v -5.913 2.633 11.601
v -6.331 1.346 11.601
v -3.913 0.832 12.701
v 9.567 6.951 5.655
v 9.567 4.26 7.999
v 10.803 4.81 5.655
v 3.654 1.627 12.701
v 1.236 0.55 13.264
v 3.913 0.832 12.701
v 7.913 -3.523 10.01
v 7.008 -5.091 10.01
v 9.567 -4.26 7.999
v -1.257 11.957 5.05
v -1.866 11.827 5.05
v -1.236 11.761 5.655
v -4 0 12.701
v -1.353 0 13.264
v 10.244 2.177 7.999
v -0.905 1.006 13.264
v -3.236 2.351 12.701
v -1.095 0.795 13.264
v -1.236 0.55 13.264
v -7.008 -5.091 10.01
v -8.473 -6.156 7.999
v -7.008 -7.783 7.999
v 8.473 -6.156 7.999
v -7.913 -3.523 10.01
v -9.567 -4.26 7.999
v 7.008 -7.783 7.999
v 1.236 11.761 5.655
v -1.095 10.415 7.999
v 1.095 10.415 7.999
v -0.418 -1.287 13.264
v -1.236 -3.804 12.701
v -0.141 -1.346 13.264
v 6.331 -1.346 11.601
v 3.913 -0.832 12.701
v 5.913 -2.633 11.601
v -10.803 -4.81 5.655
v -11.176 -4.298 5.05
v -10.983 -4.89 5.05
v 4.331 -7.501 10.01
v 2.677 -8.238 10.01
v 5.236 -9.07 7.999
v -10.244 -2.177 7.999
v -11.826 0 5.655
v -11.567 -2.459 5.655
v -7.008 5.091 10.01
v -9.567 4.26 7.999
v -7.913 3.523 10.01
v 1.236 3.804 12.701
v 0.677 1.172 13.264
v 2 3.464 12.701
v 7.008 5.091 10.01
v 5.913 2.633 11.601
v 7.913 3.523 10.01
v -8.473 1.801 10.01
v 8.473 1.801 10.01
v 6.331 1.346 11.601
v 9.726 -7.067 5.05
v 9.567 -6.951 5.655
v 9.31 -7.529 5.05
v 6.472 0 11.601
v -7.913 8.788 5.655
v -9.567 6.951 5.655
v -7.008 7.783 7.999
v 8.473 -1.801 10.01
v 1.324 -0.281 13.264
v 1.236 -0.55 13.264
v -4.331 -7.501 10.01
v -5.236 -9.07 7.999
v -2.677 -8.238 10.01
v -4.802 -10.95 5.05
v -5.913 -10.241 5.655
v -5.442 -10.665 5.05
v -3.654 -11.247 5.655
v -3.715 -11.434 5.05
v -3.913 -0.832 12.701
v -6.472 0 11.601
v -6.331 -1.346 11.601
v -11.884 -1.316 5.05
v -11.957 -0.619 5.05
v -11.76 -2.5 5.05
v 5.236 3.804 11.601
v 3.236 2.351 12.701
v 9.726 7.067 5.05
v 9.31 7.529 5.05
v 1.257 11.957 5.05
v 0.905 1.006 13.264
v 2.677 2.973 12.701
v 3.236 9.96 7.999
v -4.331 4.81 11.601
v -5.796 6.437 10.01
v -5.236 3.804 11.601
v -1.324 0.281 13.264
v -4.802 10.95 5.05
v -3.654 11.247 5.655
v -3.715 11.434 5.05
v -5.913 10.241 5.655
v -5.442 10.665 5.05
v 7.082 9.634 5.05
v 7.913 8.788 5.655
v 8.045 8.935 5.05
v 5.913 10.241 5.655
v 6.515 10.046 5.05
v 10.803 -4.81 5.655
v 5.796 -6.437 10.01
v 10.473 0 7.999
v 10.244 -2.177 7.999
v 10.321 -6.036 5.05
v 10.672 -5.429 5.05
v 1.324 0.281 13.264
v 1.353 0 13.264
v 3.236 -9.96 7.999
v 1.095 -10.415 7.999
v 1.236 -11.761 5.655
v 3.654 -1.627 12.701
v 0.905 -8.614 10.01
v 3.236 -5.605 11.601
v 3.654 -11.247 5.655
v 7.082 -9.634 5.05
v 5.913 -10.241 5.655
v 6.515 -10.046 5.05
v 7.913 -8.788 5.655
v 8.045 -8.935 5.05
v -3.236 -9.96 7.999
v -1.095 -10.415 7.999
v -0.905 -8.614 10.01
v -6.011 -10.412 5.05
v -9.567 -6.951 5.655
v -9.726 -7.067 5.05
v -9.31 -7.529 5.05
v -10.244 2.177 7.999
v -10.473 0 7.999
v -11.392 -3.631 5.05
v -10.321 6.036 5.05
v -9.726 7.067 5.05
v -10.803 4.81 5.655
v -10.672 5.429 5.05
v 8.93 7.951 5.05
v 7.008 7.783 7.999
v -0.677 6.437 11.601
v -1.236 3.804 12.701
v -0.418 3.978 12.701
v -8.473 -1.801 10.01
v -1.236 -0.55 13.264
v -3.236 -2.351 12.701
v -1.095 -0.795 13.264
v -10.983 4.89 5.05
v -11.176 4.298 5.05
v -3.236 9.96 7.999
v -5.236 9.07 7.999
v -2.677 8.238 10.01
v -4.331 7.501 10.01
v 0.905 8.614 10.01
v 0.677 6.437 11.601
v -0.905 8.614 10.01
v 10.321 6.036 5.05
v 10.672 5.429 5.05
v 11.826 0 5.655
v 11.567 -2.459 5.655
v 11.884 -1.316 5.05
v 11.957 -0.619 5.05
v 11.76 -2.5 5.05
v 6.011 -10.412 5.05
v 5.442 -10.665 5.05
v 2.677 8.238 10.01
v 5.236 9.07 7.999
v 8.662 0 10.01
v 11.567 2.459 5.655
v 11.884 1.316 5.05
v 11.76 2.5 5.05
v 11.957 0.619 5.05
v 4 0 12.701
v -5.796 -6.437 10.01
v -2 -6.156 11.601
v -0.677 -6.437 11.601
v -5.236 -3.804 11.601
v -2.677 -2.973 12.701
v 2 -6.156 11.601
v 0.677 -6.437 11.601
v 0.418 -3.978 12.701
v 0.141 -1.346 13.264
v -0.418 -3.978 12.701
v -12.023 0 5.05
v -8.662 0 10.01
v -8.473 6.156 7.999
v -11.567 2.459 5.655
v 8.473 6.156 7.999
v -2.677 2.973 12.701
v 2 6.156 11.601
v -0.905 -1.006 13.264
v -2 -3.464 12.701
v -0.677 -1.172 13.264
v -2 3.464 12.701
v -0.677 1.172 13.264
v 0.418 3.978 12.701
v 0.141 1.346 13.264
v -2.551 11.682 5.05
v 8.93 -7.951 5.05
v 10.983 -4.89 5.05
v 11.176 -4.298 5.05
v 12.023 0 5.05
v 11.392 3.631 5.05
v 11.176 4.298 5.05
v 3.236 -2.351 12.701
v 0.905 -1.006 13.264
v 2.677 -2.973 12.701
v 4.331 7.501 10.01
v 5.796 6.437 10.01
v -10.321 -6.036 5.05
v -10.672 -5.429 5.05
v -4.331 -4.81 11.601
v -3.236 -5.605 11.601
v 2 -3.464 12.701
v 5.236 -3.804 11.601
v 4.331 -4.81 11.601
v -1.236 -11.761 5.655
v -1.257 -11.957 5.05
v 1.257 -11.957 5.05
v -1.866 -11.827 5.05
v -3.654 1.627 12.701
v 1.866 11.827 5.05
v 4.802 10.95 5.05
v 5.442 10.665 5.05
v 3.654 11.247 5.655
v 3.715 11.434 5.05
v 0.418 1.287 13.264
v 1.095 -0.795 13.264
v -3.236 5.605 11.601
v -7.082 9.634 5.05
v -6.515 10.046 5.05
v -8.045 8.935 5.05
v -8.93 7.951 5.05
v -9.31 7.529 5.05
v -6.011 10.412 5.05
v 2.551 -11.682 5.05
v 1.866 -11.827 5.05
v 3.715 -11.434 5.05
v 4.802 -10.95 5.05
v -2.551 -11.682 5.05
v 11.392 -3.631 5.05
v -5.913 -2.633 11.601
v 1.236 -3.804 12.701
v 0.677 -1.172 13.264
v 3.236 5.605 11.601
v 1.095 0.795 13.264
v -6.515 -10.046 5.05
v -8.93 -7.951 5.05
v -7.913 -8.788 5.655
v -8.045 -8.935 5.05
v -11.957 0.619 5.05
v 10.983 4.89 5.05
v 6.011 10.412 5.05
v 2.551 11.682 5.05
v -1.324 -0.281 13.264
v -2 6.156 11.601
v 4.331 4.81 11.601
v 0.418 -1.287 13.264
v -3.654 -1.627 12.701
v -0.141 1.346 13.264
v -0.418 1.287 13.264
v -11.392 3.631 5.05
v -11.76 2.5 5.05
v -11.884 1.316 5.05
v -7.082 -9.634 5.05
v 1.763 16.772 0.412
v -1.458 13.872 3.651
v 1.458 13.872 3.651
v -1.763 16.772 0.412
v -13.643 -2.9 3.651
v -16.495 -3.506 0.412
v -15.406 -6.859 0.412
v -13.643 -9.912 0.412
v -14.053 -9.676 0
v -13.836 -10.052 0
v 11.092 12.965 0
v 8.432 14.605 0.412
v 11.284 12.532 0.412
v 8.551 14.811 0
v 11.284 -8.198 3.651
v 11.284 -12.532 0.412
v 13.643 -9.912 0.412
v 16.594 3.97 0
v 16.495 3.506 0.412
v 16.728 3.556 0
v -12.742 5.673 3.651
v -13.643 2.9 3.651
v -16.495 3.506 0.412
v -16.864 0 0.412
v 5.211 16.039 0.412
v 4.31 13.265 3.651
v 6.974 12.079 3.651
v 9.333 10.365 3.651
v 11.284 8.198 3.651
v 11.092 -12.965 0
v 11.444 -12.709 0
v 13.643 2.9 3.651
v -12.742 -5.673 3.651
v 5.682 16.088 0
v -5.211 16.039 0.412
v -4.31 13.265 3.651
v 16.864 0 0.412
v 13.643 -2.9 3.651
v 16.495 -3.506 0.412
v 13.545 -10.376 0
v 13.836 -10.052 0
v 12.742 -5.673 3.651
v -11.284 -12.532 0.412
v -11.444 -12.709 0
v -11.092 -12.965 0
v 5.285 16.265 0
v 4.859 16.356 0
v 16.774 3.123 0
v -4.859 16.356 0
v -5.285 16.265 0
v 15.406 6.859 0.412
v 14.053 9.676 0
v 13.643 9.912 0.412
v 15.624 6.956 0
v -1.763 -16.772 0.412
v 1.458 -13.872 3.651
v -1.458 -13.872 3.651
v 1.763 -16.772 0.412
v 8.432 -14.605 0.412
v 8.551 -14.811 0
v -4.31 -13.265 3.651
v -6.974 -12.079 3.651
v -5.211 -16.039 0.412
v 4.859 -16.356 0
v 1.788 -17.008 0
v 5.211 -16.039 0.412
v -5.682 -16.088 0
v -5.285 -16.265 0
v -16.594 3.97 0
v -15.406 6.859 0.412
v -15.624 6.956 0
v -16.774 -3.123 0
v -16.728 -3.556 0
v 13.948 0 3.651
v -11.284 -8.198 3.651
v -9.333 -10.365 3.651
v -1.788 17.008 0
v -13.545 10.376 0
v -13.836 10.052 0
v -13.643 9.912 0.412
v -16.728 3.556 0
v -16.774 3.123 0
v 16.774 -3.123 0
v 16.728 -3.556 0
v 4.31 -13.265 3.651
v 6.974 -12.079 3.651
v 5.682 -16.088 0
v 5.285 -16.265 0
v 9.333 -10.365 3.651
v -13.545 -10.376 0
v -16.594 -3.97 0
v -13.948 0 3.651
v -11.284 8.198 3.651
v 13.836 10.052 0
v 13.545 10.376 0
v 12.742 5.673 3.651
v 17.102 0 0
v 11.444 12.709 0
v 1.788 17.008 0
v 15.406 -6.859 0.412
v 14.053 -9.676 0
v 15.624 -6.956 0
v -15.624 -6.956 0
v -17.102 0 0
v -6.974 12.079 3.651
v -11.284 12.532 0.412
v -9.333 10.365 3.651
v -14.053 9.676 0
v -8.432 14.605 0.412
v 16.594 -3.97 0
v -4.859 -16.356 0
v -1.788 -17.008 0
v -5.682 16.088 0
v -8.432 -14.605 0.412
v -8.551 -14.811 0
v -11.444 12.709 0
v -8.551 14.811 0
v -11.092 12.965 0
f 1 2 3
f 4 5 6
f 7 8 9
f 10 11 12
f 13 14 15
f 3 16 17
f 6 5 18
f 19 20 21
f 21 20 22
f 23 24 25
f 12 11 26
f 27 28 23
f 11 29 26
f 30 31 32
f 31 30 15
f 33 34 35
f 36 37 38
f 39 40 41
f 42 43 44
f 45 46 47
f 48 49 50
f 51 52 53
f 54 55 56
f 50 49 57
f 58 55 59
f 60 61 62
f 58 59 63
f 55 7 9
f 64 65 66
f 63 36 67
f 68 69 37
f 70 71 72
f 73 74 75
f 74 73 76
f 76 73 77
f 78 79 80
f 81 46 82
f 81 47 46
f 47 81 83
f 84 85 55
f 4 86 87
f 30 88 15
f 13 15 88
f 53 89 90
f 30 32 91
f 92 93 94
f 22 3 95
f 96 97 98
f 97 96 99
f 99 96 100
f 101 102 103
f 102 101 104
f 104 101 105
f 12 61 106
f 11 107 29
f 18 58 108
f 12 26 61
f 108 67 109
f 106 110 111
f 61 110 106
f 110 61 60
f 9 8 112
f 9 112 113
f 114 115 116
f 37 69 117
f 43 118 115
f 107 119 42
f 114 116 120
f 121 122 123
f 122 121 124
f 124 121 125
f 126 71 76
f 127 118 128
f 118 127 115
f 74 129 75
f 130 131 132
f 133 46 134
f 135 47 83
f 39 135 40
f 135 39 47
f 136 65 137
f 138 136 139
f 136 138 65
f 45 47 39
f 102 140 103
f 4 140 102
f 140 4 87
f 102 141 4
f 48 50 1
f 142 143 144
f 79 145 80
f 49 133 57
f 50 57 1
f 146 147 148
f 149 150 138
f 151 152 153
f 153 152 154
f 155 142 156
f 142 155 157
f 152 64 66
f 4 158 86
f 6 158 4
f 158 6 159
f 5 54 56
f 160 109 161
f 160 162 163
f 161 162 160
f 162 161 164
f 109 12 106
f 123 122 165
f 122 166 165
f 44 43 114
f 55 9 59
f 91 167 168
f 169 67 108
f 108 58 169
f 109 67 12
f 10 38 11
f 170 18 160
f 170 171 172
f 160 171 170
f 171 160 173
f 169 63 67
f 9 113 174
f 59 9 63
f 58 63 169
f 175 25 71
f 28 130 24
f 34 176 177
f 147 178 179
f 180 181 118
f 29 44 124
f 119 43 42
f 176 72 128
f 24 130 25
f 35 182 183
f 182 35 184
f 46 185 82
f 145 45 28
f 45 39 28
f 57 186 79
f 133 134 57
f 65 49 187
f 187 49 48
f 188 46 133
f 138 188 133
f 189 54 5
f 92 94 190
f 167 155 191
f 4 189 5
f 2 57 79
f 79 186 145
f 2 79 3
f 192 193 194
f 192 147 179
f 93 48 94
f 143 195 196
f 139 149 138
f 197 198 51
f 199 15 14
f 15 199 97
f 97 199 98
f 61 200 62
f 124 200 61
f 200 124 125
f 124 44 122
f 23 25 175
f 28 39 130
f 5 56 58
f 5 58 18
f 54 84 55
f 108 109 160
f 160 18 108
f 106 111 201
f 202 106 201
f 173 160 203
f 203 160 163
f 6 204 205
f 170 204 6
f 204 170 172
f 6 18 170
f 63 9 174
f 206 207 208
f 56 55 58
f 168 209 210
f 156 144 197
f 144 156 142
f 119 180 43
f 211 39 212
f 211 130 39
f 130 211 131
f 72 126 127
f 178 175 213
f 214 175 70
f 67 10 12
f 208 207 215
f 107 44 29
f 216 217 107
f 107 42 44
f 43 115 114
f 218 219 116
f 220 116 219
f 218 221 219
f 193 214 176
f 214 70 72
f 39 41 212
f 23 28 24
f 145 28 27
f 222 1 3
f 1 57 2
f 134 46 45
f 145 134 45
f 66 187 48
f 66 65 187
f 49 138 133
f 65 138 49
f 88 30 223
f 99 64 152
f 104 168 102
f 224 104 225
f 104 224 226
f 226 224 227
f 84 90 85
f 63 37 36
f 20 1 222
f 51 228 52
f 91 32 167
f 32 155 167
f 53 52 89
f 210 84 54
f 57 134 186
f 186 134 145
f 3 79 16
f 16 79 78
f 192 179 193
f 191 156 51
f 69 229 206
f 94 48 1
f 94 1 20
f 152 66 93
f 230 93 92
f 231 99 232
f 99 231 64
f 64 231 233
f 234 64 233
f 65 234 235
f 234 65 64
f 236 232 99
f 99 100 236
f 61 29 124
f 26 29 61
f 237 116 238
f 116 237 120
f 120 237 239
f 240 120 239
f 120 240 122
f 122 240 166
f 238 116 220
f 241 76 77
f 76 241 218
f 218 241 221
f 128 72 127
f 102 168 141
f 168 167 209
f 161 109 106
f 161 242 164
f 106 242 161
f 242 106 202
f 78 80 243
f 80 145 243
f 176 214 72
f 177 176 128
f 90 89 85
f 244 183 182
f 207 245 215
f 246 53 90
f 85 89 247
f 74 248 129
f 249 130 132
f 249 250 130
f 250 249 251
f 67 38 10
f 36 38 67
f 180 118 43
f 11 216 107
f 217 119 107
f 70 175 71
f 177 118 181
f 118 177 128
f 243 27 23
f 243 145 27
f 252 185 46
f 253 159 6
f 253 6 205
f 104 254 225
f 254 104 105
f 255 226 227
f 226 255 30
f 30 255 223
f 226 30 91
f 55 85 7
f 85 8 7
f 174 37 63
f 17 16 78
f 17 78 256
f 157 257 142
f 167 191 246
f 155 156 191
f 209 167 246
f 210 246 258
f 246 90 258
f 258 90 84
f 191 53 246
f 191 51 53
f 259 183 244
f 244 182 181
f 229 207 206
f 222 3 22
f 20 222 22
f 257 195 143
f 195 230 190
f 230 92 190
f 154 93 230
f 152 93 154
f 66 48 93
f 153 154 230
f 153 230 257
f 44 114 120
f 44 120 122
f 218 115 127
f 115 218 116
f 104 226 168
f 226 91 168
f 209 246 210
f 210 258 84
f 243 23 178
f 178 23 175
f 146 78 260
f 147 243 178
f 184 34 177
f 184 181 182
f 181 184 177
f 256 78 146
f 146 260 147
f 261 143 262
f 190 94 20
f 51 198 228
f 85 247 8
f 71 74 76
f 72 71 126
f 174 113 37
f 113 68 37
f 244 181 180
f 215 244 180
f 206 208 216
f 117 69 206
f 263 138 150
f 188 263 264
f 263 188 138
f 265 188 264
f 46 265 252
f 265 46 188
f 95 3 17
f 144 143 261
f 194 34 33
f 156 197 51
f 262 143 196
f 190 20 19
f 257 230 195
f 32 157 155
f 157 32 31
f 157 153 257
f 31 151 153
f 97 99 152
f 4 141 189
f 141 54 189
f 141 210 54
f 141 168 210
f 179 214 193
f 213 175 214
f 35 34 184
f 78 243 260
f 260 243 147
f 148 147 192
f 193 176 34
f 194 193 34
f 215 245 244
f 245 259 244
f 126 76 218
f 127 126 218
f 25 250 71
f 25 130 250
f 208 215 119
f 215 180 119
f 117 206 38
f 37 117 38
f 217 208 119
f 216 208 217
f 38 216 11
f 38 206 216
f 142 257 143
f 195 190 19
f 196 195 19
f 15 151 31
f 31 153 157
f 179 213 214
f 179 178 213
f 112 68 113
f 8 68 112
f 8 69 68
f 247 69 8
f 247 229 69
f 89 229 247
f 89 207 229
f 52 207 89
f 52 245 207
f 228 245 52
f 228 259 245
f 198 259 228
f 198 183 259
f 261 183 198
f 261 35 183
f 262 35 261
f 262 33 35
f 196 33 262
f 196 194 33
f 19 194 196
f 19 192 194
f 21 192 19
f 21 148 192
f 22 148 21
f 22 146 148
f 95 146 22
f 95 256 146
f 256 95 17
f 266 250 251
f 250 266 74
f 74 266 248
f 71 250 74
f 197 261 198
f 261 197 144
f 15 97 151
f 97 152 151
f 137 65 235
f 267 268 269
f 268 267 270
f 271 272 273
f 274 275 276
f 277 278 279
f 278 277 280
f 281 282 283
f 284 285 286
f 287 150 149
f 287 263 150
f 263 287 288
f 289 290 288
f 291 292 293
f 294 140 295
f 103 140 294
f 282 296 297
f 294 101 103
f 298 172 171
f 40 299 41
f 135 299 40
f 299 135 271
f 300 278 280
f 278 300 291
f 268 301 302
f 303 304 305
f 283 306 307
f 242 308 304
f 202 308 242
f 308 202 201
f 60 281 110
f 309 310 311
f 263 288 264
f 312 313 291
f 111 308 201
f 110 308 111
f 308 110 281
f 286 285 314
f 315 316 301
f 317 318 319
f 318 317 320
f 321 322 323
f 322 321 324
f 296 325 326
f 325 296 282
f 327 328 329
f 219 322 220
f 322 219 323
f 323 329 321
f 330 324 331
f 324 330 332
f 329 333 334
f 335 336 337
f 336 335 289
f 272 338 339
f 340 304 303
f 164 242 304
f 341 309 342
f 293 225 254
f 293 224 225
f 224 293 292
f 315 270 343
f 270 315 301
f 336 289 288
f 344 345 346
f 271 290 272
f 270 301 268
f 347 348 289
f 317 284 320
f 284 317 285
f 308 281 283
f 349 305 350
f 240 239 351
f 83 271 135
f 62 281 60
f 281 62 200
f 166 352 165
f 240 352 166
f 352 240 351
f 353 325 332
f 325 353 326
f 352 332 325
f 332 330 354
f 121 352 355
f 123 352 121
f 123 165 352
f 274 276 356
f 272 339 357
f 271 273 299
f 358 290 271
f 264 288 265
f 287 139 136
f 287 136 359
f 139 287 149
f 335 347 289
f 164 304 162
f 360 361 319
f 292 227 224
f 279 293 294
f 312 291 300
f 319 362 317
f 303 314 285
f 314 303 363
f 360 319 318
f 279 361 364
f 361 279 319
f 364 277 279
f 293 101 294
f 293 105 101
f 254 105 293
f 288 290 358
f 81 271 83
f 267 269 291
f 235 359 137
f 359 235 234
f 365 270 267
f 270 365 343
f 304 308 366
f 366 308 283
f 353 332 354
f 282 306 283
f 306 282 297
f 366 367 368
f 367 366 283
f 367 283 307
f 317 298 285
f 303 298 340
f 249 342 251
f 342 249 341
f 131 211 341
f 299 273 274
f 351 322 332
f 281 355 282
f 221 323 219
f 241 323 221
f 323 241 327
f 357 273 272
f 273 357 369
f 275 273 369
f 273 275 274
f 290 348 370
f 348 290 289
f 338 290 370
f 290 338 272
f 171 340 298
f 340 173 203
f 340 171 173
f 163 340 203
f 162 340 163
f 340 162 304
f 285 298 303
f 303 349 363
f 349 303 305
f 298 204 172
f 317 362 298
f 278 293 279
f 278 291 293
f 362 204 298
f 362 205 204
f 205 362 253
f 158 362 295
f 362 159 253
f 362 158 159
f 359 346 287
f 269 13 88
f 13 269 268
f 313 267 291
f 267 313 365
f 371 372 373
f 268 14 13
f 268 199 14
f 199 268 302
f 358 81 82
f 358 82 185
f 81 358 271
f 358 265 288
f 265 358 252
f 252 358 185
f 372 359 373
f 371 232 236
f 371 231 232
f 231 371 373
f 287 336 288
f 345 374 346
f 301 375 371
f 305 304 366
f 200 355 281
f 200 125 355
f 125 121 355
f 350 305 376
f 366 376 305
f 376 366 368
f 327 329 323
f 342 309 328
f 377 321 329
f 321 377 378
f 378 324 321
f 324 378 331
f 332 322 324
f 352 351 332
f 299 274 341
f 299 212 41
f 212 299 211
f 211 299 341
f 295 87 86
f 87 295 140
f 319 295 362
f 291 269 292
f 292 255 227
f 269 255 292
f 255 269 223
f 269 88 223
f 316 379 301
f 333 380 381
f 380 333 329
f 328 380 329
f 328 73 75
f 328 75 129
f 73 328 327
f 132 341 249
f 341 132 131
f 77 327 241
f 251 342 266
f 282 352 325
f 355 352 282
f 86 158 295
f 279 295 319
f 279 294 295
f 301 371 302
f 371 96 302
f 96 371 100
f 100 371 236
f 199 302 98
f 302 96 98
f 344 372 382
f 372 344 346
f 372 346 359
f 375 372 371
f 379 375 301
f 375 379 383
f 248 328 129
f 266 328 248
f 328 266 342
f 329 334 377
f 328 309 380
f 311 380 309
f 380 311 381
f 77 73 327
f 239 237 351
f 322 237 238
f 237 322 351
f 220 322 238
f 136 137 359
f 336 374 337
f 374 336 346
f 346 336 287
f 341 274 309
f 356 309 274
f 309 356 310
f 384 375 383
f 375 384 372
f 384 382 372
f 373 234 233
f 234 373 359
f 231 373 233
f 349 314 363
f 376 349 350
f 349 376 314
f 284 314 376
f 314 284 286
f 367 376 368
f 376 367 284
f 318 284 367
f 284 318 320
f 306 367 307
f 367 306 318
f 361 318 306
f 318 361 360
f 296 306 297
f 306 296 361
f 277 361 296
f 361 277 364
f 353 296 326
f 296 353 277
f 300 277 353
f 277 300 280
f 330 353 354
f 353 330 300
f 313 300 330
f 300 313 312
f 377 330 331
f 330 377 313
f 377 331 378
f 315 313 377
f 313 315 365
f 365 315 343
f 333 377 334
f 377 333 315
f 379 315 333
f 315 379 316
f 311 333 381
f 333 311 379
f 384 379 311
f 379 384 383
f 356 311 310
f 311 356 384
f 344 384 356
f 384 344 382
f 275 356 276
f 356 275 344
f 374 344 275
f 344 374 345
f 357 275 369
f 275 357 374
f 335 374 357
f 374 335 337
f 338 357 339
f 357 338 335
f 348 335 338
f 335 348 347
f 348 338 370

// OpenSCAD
// Please insert the measures of the condenser as illustrated in the drawing if you know only the Iris diameter, put it and leave the other number as generated



// Diameter of the small mirror sphere
sph_diam_1 = 25.89; //[25.89]
//Diameter of the beam exit sphere
sph_diam_2 = 41.69;  //[41.69]
// Distance between the two spheres centre
sph_offset = 12.23; //[12.23]
// Maximum Diameter of the plug 
outer_diam = 33.6; //[33.60]
// Height of max diameter rim use 05 or 1 mm
rim_height = 0.5; //[0.5]

sph_center_2 = rim_height -  pow(pow(sph_diam_2/2,2) - pow(outer_diam/2,2),0.5);
sph_center_1 = sph_center_2 + sph_offset;
   
    

module make_part(){
intersection(){
    translate([0,0,0])cylinder(100,   outer_diam, outer_diam, true);
intersection() {
    translate([0,0,100])cube(200, center=true);
    union() {
    translate([0,0,sph_center_1])sphere(sph_diam_1/2);
    translate([0,0,sph_center_2])sphere(sph_diam_2/2); 
          }
        }
      }
}


    make_part();
